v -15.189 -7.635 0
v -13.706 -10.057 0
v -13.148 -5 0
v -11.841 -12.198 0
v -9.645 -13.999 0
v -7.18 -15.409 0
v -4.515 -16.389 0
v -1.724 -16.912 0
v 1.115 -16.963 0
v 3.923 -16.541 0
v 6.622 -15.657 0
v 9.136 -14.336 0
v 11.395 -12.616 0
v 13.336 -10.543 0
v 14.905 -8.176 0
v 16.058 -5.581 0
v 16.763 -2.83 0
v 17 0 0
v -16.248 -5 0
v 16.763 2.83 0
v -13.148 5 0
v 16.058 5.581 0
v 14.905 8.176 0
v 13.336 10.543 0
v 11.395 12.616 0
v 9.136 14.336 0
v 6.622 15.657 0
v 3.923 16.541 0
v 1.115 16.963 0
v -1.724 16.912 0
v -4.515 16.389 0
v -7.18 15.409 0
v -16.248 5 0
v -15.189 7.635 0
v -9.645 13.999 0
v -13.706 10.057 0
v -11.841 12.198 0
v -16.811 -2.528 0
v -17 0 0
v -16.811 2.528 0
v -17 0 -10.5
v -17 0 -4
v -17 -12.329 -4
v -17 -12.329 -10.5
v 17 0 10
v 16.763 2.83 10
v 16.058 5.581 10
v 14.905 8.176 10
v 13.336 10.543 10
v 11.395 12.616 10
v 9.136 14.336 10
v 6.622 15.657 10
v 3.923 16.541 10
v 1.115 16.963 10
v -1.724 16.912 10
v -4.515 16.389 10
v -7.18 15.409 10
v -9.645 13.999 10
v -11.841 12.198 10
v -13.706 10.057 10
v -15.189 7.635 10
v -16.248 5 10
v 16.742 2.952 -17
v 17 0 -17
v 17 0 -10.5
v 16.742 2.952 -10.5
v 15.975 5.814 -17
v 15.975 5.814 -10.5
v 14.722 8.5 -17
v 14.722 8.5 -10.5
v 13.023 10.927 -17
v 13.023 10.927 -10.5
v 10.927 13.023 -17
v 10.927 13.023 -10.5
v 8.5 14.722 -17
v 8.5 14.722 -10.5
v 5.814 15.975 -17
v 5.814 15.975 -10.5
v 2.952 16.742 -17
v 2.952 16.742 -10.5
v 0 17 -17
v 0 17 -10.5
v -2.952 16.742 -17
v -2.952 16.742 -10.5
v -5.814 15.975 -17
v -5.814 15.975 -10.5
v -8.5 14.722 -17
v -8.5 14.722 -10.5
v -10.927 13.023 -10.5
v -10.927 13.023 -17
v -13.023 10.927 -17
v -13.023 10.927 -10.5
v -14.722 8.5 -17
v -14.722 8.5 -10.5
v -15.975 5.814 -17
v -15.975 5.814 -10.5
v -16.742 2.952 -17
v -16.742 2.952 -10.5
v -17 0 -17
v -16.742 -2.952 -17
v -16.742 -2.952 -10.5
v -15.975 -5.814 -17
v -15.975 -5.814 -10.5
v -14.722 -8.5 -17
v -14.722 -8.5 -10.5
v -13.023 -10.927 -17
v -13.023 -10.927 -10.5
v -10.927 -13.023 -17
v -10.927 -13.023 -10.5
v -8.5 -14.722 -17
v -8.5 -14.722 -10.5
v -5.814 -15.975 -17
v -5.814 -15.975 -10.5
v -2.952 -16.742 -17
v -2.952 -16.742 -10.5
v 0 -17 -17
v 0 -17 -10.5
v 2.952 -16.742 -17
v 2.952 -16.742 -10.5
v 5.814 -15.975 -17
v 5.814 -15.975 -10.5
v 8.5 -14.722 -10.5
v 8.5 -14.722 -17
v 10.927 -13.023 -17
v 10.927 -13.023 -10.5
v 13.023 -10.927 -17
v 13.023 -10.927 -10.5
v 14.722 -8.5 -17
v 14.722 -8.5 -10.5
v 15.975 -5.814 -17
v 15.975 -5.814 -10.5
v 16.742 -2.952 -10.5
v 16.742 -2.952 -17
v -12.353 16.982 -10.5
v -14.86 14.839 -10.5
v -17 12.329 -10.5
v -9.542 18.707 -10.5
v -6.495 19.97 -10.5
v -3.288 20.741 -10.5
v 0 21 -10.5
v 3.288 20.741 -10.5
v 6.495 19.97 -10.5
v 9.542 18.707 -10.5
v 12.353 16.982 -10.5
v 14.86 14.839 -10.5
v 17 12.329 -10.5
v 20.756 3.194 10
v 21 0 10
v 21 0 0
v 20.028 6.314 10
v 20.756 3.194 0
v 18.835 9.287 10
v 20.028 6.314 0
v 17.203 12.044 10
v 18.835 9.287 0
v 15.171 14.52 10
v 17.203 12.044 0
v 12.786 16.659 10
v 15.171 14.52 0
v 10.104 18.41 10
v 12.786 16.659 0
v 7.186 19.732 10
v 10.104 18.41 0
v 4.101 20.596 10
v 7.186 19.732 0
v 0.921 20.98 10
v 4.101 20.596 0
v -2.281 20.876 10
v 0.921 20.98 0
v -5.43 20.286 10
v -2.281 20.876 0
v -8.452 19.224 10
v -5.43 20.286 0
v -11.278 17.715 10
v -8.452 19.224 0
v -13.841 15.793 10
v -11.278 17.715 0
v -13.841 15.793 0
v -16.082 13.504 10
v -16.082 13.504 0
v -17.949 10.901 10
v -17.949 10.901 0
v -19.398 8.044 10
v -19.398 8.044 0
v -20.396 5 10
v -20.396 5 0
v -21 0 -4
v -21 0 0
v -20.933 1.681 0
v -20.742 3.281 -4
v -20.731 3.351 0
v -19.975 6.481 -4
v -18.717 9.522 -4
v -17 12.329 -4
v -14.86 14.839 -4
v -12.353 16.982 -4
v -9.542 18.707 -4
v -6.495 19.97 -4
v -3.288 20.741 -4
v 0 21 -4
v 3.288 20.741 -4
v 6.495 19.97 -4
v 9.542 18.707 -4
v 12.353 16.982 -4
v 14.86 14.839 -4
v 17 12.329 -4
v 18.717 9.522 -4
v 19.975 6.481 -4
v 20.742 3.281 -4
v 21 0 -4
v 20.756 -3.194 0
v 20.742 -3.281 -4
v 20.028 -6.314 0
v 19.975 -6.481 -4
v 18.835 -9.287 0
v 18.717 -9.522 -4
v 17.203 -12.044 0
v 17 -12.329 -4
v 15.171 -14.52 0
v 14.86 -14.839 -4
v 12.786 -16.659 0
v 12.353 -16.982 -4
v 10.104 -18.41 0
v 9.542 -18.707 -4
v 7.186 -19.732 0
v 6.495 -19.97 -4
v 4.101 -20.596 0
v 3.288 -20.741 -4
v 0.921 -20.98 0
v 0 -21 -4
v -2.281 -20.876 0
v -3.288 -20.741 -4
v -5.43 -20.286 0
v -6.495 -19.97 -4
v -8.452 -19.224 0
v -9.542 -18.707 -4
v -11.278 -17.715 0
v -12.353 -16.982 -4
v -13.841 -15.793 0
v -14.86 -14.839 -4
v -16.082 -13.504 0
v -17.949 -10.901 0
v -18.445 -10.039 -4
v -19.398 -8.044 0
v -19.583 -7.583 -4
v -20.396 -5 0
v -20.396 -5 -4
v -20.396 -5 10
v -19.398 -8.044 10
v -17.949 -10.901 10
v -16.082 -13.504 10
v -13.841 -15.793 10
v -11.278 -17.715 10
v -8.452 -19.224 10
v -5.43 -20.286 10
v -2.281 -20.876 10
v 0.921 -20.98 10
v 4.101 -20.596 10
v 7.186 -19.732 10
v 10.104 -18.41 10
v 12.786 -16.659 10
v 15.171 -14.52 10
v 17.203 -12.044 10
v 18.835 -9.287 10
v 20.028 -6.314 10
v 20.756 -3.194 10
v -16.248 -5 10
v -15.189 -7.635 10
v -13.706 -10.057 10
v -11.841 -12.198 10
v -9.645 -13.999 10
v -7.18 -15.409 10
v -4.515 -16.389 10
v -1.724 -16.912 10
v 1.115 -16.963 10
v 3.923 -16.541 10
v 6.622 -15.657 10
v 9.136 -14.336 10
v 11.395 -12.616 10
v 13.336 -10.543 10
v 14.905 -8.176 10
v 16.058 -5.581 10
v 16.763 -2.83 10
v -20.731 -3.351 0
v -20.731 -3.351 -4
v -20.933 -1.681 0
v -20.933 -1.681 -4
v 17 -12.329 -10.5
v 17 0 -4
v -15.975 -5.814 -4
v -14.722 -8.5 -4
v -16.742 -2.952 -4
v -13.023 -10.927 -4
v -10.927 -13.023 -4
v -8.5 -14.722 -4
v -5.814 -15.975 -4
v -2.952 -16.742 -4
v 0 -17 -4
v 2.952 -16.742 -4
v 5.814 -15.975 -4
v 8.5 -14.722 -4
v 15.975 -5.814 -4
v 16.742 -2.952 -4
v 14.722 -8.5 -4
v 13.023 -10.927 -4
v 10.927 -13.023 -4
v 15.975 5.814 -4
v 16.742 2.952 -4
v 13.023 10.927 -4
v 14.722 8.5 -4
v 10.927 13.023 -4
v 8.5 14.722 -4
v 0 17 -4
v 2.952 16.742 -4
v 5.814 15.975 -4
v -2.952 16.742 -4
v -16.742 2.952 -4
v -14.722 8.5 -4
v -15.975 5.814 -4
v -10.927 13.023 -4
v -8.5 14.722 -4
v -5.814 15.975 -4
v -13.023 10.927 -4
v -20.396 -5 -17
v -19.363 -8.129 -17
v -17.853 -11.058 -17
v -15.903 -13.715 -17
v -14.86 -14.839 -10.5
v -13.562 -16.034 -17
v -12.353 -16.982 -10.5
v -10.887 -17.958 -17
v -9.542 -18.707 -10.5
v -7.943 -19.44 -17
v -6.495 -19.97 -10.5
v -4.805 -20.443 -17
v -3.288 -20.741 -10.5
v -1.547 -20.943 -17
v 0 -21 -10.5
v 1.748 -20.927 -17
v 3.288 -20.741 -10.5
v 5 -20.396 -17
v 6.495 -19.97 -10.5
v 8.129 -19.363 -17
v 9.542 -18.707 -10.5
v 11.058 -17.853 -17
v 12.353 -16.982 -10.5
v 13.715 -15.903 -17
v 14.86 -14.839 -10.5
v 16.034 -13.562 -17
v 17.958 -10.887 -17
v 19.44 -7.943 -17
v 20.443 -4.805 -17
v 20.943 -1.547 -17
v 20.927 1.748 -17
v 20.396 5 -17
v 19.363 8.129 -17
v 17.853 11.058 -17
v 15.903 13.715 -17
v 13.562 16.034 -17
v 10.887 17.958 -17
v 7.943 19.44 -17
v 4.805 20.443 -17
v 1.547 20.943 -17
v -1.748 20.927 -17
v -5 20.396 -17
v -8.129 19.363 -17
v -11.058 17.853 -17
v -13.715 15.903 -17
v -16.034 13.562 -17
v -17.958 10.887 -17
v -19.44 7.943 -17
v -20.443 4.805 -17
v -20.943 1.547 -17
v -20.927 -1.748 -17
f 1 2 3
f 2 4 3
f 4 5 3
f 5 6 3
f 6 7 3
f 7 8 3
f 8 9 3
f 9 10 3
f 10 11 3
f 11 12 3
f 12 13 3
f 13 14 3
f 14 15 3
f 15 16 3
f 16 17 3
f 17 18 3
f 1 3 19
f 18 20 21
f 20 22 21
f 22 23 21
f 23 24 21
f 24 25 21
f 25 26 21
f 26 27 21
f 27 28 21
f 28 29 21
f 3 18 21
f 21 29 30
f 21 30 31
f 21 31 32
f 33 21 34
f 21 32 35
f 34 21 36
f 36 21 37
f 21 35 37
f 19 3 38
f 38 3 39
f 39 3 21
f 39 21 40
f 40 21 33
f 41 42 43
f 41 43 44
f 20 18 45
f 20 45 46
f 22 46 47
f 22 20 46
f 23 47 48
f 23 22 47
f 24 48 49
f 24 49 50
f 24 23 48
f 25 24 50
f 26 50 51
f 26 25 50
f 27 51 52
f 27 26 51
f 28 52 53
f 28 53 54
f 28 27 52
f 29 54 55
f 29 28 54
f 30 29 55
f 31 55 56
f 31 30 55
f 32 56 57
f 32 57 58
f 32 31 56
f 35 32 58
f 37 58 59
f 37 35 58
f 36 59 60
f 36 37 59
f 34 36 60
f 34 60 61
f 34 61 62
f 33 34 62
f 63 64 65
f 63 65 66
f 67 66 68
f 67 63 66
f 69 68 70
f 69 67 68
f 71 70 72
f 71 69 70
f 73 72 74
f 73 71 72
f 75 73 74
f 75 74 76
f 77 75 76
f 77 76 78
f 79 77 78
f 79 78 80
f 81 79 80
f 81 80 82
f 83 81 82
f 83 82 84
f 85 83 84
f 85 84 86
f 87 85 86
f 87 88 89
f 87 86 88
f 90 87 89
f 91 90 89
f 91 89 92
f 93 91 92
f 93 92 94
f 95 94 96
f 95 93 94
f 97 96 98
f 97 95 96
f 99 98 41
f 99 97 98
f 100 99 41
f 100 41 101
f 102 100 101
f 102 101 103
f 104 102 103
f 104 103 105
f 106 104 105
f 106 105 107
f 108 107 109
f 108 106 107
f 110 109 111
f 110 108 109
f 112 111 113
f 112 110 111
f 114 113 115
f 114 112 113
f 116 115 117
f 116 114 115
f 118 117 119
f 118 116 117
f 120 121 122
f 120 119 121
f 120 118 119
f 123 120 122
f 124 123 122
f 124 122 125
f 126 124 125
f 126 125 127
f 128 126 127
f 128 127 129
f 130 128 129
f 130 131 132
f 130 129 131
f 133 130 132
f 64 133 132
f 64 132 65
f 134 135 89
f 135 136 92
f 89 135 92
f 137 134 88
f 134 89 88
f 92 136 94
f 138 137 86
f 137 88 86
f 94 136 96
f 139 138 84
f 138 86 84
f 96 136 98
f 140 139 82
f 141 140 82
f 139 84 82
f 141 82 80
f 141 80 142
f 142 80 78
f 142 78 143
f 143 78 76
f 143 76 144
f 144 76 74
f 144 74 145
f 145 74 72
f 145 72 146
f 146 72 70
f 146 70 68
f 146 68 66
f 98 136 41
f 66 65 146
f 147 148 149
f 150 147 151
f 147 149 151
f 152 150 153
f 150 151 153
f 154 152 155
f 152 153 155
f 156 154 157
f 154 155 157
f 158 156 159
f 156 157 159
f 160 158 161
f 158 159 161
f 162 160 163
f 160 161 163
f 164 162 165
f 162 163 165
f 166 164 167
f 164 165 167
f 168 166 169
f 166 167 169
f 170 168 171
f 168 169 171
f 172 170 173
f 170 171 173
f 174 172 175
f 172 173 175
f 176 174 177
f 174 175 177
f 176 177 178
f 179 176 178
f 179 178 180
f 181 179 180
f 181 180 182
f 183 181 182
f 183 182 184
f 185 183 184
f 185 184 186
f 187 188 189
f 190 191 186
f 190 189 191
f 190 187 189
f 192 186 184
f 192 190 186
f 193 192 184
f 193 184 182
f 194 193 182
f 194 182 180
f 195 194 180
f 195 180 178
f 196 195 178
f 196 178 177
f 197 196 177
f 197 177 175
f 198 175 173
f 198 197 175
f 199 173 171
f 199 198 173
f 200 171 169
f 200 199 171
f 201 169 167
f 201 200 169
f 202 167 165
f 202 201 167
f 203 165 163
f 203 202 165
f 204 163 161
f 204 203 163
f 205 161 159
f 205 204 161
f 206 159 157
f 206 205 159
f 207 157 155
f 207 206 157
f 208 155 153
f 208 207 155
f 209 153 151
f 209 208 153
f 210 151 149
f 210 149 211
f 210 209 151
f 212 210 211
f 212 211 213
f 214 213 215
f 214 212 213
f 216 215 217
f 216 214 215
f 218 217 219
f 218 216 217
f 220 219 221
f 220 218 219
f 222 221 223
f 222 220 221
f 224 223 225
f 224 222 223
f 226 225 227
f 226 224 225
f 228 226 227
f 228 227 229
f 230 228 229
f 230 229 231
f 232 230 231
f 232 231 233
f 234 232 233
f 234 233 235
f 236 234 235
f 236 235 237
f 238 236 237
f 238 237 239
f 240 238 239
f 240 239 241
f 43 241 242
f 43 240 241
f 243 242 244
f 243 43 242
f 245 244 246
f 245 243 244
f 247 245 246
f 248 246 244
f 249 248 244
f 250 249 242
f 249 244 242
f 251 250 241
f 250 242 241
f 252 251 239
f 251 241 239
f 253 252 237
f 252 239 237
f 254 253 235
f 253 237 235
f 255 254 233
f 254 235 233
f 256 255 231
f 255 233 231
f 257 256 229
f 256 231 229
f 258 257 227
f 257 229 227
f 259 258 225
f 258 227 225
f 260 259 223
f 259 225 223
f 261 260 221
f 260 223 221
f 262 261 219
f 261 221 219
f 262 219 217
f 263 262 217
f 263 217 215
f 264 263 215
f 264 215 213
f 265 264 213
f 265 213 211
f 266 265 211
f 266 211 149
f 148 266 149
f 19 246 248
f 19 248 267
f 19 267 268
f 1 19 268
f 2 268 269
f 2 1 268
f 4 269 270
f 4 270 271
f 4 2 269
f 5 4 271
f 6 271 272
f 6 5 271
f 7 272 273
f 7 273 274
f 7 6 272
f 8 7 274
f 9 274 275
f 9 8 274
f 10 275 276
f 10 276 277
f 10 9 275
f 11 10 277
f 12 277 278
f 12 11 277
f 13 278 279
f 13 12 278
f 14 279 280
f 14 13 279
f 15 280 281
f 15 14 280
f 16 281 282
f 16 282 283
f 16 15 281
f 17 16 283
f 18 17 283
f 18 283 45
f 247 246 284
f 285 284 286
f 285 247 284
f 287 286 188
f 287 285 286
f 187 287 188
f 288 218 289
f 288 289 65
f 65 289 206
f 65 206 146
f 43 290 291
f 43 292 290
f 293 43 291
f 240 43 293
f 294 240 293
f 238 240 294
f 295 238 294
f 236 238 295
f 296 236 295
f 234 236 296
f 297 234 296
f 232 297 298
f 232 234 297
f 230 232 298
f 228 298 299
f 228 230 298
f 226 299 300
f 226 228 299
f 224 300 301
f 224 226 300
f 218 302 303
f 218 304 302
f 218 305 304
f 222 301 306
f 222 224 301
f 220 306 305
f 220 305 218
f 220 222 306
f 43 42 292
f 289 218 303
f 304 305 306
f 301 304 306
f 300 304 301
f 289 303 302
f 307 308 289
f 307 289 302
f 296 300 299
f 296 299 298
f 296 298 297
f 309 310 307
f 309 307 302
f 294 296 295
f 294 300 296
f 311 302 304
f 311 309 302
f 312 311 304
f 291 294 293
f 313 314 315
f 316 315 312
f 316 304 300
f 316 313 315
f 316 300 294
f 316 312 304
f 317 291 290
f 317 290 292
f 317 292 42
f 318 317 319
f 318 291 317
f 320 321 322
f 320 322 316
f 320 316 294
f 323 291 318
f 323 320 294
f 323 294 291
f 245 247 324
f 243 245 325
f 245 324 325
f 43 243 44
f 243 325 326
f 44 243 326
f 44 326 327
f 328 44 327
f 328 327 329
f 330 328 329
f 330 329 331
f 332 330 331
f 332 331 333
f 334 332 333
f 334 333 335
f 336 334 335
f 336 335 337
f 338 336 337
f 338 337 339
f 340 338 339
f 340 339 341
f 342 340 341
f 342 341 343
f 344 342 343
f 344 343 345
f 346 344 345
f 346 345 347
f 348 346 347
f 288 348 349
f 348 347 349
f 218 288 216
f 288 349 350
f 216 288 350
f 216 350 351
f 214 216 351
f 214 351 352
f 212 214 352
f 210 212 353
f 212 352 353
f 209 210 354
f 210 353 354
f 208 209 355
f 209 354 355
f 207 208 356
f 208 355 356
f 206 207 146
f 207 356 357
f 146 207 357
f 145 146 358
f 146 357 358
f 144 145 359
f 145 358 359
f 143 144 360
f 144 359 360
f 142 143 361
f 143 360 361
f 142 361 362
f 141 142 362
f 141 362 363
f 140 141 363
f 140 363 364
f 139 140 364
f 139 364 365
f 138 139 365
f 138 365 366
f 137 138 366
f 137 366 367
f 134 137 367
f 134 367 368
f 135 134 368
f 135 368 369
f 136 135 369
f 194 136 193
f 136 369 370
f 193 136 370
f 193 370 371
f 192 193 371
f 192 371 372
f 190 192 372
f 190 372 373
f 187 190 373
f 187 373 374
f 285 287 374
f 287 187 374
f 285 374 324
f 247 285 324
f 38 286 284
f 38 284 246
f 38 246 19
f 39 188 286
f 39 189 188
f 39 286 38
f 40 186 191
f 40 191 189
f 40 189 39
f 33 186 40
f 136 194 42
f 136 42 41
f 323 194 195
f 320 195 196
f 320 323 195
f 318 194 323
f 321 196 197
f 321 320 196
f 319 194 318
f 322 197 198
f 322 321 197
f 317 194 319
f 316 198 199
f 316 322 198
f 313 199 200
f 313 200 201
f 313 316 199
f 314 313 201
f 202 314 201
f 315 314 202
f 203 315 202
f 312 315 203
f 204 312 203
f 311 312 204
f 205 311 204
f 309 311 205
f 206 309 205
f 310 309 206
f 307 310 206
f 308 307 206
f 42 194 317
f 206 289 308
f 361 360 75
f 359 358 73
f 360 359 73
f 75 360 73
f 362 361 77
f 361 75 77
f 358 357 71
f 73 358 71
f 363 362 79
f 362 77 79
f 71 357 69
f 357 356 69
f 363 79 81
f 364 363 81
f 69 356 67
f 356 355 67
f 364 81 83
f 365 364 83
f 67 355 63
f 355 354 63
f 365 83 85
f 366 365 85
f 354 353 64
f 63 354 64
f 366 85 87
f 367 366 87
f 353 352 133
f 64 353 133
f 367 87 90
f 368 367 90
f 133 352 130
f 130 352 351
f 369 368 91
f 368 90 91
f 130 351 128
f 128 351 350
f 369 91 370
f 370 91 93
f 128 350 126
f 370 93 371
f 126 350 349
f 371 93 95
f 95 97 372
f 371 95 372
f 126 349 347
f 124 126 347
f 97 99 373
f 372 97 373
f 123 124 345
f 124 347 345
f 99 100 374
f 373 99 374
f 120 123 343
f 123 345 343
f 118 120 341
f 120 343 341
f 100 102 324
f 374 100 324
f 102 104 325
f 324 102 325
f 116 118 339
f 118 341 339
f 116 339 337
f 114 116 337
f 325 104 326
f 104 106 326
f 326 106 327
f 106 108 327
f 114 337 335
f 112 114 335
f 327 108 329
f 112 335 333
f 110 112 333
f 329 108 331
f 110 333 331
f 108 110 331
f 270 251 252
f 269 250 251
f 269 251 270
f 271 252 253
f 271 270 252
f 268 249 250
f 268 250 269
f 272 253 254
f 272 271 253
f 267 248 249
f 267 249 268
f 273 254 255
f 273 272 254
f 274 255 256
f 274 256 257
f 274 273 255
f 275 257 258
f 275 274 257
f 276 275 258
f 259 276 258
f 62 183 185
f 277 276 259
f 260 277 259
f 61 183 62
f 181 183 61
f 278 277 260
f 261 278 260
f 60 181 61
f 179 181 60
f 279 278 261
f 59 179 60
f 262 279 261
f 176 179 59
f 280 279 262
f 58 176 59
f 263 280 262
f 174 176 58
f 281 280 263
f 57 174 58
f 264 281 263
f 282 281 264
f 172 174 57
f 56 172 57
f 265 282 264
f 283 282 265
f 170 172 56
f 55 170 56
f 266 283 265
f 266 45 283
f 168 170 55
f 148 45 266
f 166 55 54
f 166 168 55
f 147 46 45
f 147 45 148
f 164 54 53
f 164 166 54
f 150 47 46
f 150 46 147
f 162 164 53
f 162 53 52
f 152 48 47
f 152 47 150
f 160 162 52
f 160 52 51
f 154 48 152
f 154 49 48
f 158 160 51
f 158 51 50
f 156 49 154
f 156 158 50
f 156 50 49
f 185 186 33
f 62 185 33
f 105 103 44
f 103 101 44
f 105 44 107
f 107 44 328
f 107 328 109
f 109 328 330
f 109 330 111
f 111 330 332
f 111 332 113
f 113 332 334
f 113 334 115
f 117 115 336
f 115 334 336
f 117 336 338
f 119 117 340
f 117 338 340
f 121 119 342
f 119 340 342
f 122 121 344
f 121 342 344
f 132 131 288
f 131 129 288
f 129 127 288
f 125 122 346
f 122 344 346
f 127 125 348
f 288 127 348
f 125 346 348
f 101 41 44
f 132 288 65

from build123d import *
from build123d.topology import SkipClean

# Parameters (mm, degrees)
ESBO_O1_R                  = 21
ESBO_O1_R_2                = 17
RESSALTO_EXTRUS_O1_DEPTH   = 10
RESSALTO_EXTRUS_O2_START   = 4
ESBO_O2_R                  = 21
RESSALTO_EXTRUS_O2_DEPTH   = 4
ESBO_O3_W                  = 15.703263836
ESBO_O3_H                  = 10
CORTE_EXTRUS_O1_DEPTH      = 10
RESSALTO_EXTRUS_O4_START   = -17
ESBO_O8_R                  = 21
ESBO_O8_R_2                = 17
RESSALTO_EXTRUS_O4_DEPTH   = 17
CORTE_EXTRUS_O3_DEPTH      = 27
CORTE_EXTRUS_O3_DEPTH_BACK = 27
ESBO_O12_W                 = 34
ESBO_O12_H                 = 6.5


with BuildPart() as part:
    # Esboço1 → Ressalto-extrusão1 (new body)
    with BuildSketch(Plane.XY):
        Circle(ESBO_O1_R)
        Circle(ESBO_O1_R_2, mode=Mode.SUBTRACT)
    extrude(amount=RESSALTO_EXTRUS_O1_DEPTH)

    # Esboço2 → Ressalto-extrusão2 (add)
    with BuildSketch(Plane(origin=(0, 0, 0), x_dir=(-1, 0, 0), z_dir=(0, 0, -1)).offset(RESSALTO_EXTRUS_O2_START)):
        Circle(ESBO_O2_R)
    extrude(amount=-RESSALTO_EXTRUS_O2_DEPTH)

    # Esboço3 → Corte-extrusão1 (cut)
    with SkipClean():  # the faces are left unmerged after this step: merging them gives an invalid solid
        with BuildSketch(Plane.XY.offset(10)):
            with Locations((-21, 0)):
                Rectangle(ESBO_O3_W, ESBO_O3_H)
        extrude(amount=-CORTE_EXTRUS_O1_DEPTH, mode=Mode.SUBTRACT)

    # Esboço8 → Ressalto-extrusão4 (add)
    with SkipClean():  # the faces are left unmerged after this step: merging them gives an invalid solid
        with BuildSketch(Plane.XY.offset(RESSALTO_EXTRUS_O4_START)):
            with Locations(Location((0, 0, 0), (0, 0, 193.774146998))):
                Circle(ESBO_O8_R)
            Circle(ESBO_O8_R_2, mode=Mode.SUBTRACT)
        extrude(amount=RESSALTO_EXTRUS_O4_DEPTH)
    add(part.part.scale(1), mode=Mode.REPLACE)  # the faces are merged on a copy

    # Esboço12 → Corte-extrusão3 (cut, two sides: drawn at the far end of the back side and taken through both)
    with BuildSketch(Plane(origin=(0, 0, 0), x_dir=(1, 0, 0), z_dir=(0, 1, 0)).offset(-CORTE_EXTRUS_O3_DEPTH_BACK)):
        with Locations((0, 7.25)):
            Rectangle(ESBO_O12_W, ESBO_O12_H)
    extrude(amount=CORTE_EXTRUS_O3_DEPTH + CORTE_EXTRUS_O3_DEPTH_BACK, mode=Mode.SUBTRACT)


solid = part.part
